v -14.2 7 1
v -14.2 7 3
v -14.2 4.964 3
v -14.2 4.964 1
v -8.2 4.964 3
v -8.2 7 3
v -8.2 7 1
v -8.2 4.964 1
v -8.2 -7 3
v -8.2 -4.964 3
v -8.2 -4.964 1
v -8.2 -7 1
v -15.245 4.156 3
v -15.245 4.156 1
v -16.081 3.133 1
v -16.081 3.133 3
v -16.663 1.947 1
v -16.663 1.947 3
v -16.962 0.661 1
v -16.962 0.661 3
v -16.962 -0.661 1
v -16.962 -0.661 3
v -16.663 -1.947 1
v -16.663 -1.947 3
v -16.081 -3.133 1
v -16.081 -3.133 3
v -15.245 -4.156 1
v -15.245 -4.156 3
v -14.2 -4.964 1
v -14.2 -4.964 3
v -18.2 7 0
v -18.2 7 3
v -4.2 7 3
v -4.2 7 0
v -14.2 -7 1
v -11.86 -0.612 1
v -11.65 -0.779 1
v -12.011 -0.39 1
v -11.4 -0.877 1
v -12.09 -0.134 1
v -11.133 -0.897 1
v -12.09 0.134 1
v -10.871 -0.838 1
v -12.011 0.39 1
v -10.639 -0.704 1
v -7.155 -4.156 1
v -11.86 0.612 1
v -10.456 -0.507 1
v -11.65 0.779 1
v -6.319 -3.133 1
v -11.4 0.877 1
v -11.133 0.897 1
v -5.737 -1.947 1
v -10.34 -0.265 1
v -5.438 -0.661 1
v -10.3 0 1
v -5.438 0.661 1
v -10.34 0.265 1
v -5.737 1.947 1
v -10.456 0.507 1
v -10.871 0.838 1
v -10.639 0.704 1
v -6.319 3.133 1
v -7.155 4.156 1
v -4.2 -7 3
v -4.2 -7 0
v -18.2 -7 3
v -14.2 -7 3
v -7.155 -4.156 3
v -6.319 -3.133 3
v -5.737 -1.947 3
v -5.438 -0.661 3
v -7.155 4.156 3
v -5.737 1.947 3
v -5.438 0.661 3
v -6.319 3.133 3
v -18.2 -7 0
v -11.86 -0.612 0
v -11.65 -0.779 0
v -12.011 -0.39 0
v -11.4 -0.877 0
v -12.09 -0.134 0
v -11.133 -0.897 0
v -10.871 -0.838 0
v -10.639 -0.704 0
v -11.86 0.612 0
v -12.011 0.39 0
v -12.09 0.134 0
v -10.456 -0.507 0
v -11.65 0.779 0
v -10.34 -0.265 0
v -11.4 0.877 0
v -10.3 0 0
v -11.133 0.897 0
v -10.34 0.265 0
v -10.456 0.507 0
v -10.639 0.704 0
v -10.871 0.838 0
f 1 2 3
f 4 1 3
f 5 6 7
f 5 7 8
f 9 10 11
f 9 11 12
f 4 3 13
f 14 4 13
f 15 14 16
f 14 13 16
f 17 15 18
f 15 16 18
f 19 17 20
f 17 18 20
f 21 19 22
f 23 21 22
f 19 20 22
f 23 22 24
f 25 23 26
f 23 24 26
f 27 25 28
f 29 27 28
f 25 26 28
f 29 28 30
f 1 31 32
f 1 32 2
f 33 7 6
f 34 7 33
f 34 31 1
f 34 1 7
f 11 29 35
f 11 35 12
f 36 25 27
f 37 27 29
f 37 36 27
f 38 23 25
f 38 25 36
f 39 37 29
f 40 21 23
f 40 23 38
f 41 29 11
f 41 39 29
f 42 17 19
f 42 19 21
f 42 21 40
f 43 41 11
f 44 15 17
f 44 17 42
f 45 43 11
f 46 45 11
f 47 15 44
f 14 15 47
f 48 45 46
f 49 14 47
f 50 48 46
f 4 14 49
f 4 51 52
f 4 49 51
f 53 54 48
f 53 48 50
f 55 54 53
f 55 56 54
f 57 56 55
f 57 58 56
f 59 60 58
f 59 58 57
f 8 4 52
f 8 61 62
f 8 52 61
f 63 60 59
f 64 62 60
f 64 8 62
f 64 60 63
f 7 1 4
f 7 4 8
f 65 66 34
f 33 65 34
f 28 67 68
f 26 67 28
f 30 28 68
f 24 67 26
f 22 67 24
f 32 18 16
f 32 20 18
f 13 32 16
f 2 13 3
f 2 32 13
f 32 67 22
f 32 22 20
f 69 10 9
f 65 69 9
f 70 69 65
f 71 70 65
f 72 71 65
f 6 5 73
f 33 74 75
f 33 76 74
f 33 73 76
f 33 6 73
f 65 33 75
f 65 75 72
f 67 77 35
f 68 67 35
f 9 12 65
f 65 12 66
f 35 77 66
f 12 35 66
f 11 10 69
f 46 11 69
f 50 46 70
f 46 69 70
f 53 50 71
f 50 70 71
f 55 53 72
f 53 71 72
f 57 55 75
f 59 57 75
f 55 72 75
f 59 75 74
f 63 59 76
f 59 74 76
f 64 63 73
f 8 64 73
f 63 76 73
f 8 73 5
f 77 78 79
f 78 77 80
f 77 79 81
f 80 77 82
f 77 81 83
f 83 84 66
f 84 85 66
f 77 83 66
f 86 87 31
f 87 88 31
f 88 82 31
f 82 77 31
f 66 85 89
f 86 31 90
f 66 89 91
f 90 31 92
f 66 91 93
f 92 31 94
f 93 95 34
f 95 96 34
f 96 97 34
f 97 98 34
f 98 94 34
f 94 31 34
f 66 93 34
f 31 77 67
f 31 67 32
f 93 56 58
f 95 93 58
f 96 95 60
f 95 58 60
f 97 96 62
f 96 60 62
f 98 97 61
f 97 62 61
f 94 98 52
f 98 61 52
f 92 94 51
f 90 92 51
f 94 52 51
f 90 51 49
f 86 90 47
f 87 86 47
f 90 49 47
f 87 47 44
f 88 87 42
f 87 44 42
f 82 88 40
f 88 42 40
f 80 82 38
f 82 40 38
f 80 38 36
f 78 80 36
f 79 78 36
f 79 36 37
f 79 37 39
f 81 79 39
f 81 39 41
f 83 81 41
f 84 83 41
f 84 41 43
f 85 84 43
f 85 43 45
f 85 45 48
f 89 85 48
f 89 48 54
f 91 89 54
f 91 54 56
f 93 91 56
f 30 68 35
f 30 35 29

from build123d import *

# Parameters (mm, degrees)
SKETCH006_W     = 14
SKETCH006_H     = 14
PAD002_DEPTH    = 3
POCKET004_DEPTH = 2
SKETCH008_R     = 0.9
POCKET005_DEPTH = 1.001


with BuildPart() as part:
    # Sketch006 → Pad002 (new body)
    with BuildSketch(Plane.XY):
        Rectangle(SKETCH006_W, SKETCH006_H)
    extrude(amount=PAD002_DEPTH)

    # Sketch007 (on Face6 of Pad002) → Pocket004 (cut)
    with BuildSketch(Plane.XY.offset(3)):
        with BuildLine():
            Line((-3, 7), (-3, 4.963869))
            ThreePointArc((-3, 4.963869), (-5.8, 0), (-3, -4.963869))
            Line((-3, -7), (-3, -4.963869))
            Line((3, -7), (-3, -7))
            Line((3, -4.963869), (3, -7))
            ThreePointArc((3, -4.963869), (5.8, 0), (3, 4.963869))
            Line((3, 7), (3, 4.963869))
            Line((-3, 7), (3, 7))
        make_face()
    extrude(amount=-POCKET004_DEPTH, mode=Mode.SUBTRACT)

    # Sketch008 (on Face6 of Pocket004) → Pocket005 (cut, through all)
    with BuildSketch(Plane.XY.offset(1)):
        Circle(SKETCH008_R)
    extrude(amount=-POCKET005_DEPTH, mode=Mode.SUBTRACT)


with BuildPart() as part_1:
    # Clone placement: moved
    add(part.part.moved(Location((-11.2, 0, 0))))


solid = part_1.part
